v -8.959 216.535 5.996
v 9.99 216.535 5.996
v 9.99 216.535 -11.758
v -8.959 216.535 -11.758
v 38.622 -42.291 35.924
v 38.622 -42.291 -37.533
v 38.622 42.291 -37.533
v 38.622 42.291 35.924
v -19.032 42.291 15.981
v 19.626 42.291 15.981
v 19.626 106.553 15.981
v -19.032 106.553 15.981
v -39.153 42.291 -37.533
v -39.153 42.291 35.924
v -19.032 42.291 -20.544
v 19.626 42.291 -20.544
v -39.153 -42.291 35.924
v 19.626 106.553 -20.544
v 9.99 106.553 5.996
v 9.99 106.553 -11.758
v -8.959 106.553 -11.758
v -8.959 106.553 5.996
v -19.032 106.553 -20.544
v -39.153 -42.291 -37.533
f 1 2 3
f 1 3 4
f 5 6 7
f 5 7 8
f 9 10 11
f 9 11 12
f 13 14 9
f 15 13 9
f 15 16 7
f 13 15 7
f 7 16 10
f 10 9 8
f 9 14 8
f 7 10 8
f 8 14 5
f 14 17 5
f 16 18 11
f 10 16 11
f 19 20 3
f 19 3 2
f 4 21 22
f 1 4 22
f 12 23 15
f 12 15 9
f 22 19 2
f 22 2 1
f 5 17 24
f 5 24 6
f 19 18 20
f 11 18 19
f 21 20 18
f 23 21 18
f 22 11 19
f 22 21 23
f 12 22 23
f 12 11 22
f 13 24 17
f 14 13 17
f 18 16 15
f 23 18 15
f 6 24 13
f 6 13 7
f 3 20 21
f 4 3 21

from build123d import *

# Parameters (mm, degrees)
F0_W     = 77.7748
F0_H     = 73.4568
F1_DEPTH = 42.291
F3_W     = 38.6588
F3_H     = 36.5252
F4_DEPTH = 64.262
F5_W     = 18.9484
F5_H     = 17.7546
F6_DEPTH = 109.982


with BuildPart() as f1:
    # F0 (on Front) → F1 (new body, symmetric)
    with BuildSketch(Plane.XZ):
        with Locations((-0.265293, -0.804183)):
            Rectangle(F0_W, F0_H)
    extrude(amount=F1_DEPTH, both=True)

    # F3 (on face) → F4 (join)
    with BuildSketch(Plane(origin=(0, 42.291, 0), x_dir=(-1, 0, 0), z_dir=(0, 1, 0))):
        with Locations((-0.297076, -2.281584)):
            Rectangle(F3_W, F3_H)
    extrude(amount=F4_DEPTH)

    # F5 (on face) → F6 (join)
    with BuildSketch(Plane(origin=(0, 106.553, 0), x_dir=(-1, 0, 0), z_dir=(0, 1, 0))):
        with Locations((-0.515443, -2.880927)):
            Rectangle(F5_W, F5_H)
    extrude(amount=F6_DEPTH)


solid = f1.part
